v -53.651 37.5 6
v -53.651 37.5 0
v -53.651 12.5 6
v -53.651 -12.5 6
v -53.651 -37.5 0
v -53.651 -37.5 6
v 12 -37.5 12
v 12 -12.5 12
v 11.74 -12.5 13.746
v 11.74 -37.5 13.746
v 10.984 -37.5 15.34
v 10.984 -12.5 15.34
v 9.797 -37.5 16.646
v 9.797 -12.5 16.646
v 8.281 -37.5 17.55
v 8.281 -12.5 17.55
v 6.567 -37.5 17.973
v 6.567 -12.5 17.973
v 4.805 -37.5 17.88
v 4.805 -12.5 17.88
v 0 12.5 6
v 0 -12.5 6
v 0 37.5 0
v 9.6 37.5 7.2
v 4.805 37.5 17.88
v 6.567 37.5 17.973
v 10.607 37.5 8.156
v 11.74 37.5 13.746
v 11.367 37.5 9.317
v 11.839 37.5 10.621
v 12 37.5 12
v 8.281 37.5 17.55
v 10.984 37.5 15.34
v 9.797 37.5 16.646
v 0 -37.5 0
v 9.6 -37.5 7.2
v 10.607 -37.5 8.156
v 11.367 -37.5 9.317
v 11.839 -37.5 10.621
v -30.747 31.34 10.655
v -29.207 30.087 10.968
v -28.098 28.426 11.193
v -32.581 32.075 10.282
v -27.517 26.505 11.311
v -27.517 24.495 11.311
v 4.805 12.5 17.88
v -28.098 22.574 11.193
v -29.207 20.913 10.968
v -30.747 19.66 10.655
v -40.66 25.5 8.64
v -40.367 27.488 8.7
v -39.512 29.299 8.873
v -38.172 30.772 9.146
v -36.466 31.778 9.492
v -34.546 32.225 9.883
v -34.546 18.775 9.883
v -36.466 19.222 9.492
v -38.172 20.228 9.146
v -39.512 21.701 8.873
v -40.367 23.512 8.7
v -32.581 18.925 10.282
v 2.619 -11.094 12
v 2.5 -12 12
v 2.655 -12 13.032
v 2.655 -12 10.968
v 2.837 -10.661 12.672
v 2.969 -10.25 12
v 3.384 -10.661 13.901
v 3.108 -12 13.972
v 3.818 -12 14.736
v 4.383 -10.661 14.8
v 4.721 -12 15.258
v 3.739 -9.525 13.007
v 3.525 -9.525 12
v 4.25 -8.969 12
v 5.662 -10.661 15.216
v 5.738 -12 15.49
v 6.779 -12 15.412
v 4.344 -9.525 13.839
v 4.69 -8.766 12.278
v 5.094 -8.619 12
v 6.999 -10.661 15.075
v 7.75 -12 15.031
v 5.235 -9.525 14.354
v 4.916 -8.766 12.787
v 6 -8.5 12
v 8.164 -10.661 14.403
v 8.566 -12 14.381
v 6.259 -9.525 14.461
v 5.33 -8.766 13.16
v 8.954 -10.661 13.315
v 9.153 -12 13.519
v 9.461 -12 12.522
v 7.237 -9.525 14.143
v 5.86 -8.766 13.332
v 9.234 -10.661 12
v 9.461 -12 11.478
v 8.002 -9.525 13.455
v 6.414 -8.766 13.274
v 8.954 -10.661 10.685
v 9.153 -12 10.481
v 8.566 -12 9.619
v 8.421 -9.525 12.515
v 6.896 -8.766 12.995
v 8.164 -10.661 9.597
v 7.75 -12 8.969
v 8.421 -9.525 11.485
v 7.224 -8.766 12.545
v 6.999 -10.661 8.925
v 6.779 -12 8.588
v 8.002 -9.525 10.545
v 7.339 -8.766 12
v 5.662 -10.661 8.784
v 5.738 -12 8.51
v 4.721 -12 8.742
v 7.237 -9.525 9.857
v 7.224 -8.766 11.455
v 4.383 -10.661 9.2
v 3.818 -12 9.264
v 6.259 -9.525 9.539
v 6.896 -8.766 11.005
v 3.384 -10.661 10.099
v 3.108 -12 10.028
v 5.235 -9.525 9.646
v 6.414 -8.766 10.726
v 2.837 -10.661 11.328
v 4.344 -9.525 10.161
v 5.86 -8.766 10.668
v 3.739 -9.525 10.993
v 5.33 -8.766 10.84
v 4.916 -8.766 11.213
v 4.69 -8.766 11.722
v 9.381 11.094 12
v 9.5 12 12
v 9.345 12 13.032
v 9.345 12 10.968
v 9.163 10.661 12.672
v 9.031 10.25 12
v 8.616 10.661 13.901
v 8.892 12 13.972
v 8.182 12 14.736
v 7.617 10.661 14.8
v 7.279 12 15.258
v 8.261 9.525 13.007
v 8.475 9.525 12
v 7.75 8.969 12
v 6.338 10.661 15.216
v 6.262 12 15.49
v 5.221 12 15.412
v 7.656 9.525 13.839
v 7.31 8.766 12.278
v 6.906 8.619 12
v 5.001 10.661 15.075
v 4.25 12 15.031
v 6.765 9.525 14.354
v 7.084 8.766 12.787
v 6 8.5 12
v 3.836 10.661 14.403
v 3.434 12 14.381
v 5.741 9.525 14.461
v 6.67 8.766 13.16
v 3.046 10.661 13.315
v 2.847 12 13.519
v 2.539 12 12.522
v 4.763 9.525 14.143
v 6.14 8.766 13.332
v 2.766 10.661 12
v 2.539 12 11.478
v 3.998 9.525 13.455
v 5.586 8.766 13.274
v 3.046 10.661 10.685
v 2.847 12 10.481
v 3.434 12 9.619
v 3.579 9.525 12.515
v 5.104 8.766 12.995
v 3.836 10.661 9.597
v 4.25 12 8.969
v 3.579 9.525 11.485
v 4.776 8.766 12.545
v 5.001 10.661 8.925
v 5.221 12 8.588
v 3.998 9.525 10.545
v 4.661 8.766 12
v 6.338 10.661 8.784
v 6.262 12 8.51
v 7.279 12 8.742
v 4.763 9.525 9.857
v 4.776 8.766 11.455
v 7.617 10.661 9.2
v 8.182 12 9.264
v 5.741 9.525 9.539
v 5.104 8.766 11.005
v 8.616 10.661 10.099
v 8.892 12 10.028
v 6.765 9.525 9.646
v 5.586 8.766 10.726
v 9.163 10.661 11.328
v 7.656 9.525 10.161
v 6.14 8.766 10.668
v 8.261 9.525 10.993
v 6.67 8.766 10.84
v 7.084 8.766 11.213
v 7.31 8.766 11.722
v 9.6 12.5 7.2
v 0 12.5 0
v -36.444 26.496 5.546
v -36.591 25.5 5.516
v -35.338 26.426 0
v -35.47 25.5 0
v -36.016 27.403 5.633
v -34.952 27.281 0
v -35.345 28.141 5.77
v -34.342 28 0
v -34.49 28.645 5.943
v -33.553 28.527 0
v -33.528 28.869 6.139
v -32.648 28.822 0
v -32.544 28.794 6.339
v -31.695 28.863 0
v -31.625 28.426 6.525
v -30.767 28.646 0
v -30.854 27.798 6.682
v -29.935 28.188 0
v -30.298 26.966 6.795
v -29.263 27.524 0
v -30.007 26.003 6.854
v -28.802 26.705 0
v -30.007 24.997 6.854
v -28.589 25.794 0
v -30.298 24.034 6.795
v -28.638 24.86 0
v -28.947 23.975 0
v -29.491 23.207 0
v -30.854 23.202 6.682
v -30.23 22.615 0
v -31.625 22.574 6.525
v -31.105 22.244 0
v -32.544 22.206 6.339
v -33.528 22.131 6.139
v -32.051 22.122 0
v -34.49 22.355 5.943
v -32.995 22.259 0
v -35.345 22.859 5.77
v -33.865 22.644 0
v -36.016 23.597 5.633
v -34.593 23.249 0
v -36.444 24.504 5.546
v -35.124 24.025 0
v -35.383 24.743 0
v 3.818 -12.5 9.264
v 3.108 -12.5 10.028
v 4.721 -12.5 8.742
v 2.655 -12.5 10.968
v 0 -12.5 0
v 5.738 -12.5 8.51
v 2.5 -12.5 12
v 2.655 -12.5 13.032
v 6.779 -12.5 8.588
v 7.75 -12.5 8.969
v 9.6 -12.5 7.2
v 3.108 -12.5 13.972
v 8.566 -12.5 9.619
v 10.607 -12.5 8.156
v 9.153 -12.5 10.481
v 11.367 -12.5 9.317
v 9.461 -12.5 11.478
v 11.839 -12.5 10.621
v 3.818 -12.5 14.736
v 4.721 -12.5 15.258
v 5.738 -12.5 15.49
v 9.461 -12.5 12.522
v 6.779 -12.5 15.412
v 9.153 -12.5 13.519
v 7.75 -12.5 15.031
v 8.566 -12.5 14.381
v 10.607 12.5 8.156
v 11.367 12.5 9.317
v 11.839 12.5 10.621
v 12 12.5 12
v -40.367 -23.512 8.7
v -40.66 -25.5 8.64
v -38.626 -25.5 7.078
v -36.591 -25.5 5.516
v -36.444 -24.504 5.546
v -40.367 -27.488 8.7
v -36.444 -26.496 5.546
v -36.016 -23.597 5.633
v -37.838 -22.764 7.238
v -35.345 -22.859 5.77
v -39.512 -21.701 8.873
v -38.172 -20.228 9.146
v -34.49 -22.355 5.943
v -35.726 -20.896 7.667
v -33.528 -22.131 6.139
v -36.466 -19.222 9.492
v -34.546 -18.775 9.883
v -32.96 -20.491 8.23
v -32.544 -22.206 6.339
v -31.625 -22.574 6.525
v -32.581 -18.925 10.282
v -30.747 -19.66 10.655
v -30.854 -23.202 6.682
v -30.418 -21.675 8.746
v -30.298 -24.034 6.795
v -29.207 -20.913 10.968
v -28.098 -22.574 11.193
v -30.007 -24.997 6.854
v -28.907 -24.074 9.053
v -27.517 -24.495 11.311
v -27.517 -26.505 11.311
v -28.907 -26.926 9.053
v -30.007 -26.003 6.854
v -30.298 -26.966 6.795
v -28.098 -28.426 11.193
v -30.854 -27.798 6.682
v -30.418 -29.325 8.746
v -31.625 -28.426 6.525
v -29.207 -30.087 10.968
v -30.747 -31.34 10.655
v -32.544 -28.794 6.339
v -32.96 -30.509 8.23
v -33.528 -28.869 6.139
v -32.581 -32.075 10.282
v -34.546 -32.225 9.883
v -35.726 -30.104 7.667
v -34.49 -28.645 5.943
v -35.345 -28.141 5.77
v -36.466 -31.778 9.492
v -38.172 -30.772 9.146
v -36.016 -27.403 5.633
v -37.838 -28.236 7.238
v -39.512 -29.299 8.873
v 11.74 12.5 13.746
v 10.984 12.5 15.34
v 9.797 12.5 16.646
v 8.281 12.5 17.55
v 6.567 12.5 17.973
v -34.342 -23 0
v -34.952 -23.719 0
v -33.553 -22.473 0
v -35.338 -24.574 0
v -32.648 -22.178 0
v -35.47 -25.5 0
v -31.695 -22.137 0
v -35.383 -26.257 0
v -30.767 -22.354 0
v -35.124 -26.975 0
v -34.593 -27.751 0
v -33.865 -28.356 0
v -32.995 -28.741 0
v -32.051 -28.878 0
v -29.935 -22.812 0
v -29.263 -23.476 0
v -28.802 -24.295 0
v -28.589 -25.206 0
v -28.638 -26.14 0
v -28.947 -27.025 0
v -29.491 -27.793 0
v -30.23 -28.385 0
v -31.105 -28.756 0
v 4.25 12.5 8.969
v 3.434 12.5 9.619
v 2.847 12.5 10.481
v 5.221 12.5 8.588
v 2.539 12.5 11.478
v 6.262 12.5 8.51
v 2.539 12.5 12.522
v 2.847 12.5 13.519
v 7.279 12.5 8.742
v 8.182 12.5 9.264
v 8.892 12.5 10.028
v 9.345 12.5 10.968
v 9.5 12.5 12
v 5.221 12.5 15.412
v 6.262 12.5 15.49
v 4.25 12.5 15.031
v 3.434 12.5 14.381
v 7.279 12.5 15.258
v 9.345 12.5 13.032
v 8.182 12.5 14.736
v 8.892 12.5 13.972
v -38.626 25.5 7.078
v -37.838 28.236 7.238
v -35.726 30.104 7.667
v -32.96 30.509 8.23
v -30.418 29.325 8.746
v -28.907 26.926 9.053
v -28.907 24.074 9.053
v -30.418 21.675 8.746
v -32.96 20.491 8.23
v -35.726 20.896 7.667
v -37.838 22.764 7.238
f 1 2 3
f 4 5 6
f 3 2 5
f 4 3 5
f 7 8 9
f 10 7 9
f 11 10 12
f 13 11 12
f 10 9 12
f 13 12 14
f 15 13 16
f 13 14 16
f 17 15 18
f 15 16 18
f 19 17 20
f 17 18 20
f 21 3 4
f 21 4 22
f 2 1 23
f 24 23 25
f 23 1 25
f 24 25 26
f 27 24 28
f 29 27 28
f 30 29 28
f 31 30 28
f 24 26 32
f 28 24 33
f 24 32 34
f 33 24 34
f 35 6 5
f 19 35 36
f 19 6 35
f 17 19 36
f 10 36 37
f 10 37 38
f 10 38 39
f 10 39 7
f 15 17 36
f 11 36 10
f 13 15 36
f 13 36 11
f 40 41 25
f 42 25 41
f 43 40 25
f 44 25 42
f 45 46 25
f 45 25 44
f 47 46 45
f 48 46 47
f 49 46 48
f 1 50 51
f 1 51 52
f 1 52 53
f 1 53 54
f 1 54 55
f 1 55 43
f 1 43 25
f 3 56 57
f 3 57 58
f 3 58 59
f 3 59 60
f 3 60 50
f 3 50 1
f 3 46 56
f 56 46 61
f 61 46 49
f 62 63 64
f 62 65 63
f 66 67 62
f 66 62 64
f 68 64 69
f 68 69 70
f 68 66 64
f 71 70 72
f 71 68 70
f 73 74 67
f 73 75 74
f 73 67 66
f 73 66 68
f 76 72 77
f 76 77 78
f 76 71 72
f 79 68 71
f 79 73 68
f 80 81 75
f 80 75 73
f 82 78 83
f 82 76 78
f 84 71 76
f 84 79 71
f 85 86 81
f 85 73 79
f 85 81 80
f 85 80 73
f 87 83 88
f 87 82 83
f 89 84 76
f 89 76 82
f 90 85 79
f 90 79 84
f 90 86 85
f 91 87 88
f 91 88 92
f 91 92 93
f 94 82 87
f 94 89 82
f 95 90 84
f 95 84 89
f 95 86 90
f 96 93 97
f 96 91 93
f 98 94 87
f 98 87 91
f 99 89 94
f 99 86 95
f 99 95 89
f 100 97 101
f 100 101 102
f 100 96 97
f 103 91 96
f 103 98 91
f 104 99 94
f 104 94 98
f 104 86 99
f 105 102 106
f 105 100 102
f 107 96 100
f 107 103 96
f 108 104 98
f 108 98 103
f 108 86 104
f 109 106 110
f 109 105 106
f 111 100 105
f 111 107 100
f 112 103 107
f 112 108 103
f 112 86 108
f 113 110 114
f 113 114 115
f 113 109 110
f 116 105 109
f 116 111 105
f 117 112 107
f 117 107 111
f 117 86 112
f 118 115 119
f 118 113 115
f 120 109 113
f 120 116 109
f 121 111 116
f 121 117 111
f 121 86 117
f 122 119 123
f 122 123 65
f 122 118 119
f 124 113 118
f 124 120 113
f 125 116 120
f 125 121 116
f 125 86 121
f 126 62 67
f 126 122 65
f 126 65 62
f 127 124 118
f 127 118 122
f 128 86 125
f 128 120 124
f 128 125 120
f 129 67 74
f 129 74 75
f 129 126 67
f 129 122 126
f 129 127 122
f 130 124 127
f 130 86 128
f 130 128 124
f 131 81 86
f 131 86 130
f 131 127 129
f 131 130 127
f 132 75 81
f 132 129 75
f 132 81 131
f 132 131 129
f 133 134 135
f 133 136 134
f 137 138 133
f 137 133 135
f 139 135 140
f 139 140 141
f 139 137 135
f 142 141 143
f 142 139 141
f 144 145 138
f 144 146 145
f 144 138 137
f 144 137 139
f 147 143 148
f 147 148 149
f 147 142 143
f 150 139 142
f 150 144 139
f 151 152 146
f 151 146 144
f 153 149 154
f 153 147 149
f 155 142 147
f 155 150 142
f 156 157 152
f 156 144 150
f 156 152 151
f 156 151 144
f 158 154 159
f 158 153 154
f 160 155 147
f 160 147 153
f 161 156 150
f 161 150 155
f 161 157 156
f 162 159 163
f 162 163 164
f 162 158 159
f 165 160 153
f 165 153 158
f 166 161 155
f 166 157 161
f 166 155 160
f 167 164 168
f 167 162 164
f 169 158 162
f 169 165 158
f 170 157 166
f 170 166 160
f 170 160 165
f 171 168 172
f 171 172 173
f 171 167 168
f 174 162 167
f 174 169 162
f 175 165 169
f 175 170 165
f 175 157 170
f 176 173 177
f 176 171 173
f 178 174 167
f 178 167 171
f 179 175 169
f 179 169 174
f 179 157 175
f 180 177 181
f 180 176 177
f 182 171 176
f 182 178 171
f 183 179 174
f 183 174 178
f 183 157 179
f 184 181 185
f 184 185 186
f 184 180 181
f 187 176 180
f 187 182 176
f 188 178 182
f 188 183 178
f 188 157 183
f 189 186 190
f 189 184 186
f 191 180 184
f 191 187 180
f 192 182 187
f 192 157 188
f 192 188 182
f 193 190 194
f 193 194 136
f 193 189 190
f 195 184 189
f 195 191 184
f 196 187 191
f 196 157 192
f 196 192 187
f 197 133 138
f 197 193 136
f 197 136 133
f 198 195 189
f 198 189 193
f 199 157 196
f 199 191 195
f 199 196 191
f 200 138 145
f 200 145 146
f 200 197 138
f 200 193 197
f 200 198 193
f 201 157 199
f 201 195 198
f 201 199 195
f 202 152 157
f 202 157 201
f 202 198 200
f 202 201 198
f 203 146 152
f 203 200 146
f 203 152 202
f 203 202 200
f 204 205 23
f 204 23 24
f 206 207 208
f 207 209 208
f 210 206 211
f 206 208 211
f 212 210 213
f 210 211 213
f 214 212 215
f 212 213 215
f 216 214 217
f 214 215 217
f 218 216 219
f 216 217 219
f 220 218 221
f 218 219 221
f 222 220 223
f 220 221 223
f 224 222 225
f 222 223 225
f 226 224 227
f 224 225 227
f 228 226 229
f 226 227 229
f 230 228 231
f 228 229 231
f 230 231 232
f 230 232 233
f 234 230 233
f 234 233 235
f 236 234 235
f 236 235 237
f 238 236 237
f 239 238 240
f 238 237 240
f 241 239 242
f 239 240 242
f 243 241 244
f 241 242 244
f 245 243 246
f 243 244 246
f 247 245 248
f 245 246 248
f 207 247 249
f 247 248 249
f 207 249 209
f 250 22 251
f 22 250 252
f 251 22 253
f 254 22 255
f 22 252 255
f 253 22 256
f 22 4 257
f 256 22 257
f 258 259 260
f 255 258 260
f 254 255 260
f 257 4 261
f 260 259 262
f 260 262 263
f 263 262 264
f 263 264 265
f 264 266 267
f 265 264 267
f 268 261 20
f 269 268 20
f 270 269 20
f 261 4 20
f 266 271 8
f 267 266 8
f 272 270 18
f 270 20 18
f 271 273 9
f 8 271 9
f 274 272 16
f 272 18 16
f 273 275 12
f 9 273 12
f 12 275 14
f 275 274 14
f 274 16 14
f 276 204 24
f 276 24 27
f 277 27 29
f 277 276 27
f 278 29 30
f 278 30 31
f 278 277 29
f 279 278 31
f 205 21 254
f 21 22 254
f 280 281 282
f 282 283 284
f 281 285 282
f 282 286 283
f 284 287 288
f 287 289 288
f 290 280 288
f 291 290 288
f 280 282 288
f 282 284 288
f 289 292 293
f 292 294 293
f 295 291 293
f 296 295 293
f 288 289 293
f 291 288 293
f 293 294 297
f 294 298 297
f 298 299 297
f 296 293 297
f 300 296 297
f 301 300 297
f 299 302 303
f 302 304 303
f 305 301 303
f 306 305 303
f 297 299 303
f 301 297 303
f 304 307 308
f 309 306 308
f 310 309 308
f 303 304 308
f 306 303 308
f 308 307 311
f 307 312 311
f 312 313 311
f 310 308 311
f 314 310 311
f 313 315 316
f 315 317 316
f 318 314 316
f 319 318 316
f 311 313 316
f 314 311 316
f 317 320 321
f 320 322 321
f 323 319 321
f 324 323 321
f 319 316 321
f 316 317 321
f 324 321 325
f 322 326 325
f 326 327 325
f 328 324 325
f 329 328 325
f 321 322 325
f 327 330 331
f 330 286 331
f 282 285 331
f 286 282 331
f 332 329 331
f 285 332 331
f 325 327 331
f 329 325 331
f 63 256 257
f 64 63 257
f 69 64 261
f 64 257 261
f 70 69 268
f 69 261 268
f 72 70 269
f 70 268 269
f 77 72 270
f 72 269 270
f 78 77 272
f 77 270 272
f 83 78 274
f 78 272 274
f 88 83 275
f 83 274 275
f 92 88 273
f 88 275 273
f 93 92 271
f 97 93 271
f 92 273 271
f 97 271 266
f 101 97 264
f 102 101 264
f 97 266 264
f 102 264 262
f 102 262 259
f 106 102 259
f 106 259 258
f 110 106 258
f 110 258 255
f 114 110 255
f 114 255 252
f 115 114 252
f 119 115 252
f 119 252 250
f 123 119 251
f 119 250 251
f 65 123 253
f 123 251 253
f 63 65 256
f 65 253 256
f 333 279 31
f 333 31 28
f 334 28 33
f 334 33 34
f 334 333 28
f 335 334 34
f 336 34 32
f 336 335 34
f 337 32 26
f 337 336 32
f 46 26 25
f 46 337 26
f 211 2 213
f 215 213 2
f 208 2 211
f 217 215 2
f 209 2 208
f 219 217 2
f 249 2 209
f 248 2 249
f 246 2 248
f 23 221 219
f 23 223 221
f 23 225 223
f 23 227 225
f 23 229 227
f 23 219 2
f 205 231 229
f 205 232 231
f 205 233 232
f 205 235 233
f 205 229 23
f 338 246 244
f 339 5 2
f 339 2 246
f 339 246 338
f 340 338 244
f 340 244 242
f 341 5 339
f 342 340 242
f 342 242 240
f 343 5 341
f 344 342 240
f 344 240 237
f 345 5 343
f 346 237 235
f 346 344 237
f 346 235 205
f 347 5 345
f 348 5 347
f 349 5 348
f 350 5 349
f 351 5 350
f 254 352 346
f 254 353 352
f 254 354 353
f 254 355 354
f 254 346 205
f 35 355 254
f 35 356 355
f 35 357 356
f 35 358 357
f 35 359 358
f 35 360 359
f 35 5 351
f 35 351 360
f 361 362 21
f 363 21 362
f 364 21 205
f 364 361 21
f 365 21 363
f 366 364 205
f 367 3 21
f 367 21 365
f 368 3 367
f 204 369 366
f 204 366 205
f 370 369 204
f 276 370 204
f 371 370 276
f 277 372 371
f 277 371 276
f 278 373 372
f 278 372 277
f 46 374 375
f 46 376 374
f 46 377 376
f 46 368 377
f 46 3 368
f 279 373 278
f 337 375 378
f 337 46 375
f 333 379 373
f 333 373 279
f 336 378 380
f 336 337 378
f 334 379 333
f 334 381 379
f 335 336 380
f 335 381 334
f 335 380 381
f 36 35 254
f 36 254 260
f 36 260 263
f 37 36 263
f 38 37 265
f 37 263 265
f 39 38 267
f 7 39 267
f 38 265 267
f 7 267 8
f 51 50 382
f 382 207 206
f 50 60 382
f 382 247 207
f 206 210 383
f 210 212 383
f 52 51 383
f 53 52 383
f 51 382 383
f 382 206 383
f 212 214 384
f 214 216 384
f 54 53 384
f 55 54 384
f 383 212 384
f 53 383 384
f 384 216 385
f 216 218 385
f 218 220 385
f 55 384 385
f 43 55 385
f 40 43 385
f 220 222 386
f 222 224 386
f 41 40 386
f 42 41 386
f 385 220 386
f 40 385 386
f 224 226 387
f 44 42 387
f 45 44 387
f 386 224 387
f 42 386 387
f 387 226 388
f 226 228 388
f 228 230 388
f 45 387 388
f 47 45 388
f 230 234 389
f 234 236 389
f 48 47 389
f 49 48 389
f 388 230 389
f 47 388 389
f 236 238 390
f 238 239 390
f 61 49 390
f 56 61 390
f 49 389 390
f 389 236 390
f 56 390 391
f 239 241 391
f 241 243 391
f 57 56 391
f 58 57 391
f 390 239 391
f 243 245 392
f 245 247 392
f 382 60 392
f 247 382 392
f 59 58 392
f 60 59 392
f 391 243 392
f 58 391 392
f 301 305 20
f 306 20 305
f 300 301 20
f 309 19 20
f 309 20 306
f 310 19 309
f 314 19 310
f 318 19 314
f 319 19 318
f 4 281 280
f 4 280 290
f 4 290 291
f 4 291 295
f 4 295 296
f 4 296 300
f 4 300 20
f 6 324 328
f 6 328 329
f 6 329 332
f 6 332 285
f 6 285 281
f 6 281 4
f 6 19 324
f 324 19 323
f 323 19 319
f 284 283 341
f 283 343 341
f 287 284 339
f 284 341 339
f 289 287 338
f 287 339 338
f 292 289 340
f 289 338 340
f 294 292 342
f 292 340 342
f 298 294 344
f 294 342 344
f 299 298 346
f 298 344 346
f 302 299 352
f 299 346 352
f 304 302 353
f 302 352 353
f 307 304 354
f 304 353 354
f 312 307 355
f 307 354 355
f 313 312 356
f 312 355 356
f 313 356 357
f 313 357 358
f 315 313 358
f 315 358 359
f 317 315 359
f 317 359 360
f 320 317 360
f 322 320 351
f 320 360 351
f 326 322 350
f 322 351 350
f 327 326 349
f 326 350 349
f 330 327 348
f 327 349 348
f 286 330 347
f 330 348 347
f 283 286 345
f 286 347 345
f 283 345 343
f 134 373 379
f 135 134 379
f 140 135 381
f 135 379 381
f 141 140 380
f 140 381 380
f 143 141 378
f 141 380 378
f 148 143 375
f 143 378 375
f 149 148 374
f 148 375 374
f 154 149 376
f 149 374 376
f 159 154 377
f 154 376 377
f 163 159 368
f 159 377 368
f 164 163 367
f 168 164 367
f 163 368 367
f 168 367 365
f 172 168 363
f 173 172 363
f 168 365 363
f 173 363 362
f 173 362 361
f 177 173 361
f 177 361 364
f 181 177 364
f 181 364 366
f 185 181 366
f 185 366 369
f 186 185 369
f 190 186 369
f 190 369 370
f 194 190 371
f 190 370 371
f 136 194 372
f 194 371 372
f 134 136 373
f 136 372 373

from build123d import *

# Parameters (mm, degrees)
F0_W            = 53.6510385573
F0_H            = 6
F0_R            = 3
F1_DEPTH        = 37.5
F1_DEPTH_BACK   = 37.5
F3_DEPTH        = 12.5
F3_DEPTH_BACK   = 12.5
F4_R            = 3.5
F5_DEPTH        = 4
F6_R            = 3.5
F7_DEPTH        = 4
F8_R            = 3.5
F10_D           = 6.7564
F10_CSINK_D     = 13.4874
F10_CSINK_ANGLE = 82


# Not quite as in the source:
# - a feature of the source that left no trace in its solid (it failed there, or was rolled back) is left out


with BuildPart() as f1:
    # F0 (on Front) → F1 (new body, two sides)
    with BuildSketch(Plane.XZ) as f1_sk:
        with Locations((-26.8255192786, 3)):
            Rectangle(F0_W, F0_H)
        with BuildLine():
            Line((0, 6), (0, 0))
            Line((0, 0), (9.6, 7.2))
            ThreePointArc((9.6, 7.2), (0.5263664708, 9.5424939495), (4.8050694646, 17.8798079064))
            Line((4.8050694646, 17.8798079064), (-53.6510385573, 6))
            Line((-53.6510385573, 6), (0, 6))
        make_face()
        with BuildLine():
            ThreePointArc((4.8050694646, 17.8798079064), (0.5263664708, 9.5424939495), (9.6, 7.2))
            ThreePointArc((9.6, 7.2), (11.366563146, 9.316718427), (12, 12))
            ThreePointArc((12, 12), (9.7967365452, 16.6459435647), (4.8050694646, 17.8798079064))
        make_face()
        with Locations((6, 12)):
            Circle(F0_R, mode=Mode.SUBTRACT)
        with Locations((6, 12)):
            Circle(F0_R)
    extrude(amount=F1_DEPTH)
    extrude(f1_sk.sketch, amount=-F1_DEPTH_BACK)

    # F0 (on Front) → F3 (cut, two sides)
    with BuildSketch(Plane.XZ) as f3_sk:
        with BuildLine():
            Line((0, 6), (0, 0))
            Line((0, 0), (9.6, 7.2))
            ThreePointArc((9.6, 7.2), (0.5263664708, 9.5424939495), (4.8050694646, 17.8798079064))
            Line((4.8050694646, 17.8798079064), (-53.6510385573, 6))
            Line((-53.6510385573, 6), (0, 6))
        make_face()
        with BuildLine():
            ThreePointArc((4.8050694646, 17.8798079064), (0.5263664708, 9.5424939495), (9.6, 7.2))
            ThreePointArc((9.6, 7.2), (11.366563146, 9.316718427), (12, 12))
            ThreePointArc((12, 12), (9.7967365452, 16.6459435647), (4.8050694646, 17.8798079064))
        make_face()
        with Locations((6, 12)):
            Circle(F0_R, mode=Mode.SUBTRACT)
        with Locations((6, 12)):
            Circle(F0_R)
    extrude(amount=F3_DEPTH, mode=Mode.SUBTRACT)
    extrude(f3_sk.sketch, amount=-F3_DEPTH_BACK, mode=Mode.SUBTRACT)

    # F4 (on face) → F5 (join)
    with BuildSketch(Plane.XZ.offset(-12.5)):
        with Locations((6, 12)):
            Circle(F4_R)
    extrude(amount=F5_DEPTH)

    # F6 (on face) → F7 (join)
    with BuildSketch(Plane(origin=(0, -12.5, 0), x_dir=(-1, 0, 0), z_dir=(0, 1, 0))):
        with Locations((-6, 12)):
            Circle(F6_R)
    extrude(amount=F7_DEPTH)

    # F8
    f8_edges = [f1.edges().sort_by_distance(p)[0] for p in [
        (9.5, -8.5, 12),
        (2.5, 8.5, 12),
    ]]
    fillet(f8_edges, radius=F8_R)

    # F10 (through all)
    with Locations(Plane(origin=(-3.2989413744, 0, 16.2328612433), x_dir=(0.9799679844, 0, 0.1991550892), z_dir=(-0.1991550892, 0, 0.9799679844))):
        with Locations((-31.3813695802, -25.5), (-31.3813695802, 25.5)):
            CounterSinkHole(F10_D / 2, F10_CSINK_D / 2, counter_sink_angle=F10_CSINK_ANGLE)


solid = f1.part
